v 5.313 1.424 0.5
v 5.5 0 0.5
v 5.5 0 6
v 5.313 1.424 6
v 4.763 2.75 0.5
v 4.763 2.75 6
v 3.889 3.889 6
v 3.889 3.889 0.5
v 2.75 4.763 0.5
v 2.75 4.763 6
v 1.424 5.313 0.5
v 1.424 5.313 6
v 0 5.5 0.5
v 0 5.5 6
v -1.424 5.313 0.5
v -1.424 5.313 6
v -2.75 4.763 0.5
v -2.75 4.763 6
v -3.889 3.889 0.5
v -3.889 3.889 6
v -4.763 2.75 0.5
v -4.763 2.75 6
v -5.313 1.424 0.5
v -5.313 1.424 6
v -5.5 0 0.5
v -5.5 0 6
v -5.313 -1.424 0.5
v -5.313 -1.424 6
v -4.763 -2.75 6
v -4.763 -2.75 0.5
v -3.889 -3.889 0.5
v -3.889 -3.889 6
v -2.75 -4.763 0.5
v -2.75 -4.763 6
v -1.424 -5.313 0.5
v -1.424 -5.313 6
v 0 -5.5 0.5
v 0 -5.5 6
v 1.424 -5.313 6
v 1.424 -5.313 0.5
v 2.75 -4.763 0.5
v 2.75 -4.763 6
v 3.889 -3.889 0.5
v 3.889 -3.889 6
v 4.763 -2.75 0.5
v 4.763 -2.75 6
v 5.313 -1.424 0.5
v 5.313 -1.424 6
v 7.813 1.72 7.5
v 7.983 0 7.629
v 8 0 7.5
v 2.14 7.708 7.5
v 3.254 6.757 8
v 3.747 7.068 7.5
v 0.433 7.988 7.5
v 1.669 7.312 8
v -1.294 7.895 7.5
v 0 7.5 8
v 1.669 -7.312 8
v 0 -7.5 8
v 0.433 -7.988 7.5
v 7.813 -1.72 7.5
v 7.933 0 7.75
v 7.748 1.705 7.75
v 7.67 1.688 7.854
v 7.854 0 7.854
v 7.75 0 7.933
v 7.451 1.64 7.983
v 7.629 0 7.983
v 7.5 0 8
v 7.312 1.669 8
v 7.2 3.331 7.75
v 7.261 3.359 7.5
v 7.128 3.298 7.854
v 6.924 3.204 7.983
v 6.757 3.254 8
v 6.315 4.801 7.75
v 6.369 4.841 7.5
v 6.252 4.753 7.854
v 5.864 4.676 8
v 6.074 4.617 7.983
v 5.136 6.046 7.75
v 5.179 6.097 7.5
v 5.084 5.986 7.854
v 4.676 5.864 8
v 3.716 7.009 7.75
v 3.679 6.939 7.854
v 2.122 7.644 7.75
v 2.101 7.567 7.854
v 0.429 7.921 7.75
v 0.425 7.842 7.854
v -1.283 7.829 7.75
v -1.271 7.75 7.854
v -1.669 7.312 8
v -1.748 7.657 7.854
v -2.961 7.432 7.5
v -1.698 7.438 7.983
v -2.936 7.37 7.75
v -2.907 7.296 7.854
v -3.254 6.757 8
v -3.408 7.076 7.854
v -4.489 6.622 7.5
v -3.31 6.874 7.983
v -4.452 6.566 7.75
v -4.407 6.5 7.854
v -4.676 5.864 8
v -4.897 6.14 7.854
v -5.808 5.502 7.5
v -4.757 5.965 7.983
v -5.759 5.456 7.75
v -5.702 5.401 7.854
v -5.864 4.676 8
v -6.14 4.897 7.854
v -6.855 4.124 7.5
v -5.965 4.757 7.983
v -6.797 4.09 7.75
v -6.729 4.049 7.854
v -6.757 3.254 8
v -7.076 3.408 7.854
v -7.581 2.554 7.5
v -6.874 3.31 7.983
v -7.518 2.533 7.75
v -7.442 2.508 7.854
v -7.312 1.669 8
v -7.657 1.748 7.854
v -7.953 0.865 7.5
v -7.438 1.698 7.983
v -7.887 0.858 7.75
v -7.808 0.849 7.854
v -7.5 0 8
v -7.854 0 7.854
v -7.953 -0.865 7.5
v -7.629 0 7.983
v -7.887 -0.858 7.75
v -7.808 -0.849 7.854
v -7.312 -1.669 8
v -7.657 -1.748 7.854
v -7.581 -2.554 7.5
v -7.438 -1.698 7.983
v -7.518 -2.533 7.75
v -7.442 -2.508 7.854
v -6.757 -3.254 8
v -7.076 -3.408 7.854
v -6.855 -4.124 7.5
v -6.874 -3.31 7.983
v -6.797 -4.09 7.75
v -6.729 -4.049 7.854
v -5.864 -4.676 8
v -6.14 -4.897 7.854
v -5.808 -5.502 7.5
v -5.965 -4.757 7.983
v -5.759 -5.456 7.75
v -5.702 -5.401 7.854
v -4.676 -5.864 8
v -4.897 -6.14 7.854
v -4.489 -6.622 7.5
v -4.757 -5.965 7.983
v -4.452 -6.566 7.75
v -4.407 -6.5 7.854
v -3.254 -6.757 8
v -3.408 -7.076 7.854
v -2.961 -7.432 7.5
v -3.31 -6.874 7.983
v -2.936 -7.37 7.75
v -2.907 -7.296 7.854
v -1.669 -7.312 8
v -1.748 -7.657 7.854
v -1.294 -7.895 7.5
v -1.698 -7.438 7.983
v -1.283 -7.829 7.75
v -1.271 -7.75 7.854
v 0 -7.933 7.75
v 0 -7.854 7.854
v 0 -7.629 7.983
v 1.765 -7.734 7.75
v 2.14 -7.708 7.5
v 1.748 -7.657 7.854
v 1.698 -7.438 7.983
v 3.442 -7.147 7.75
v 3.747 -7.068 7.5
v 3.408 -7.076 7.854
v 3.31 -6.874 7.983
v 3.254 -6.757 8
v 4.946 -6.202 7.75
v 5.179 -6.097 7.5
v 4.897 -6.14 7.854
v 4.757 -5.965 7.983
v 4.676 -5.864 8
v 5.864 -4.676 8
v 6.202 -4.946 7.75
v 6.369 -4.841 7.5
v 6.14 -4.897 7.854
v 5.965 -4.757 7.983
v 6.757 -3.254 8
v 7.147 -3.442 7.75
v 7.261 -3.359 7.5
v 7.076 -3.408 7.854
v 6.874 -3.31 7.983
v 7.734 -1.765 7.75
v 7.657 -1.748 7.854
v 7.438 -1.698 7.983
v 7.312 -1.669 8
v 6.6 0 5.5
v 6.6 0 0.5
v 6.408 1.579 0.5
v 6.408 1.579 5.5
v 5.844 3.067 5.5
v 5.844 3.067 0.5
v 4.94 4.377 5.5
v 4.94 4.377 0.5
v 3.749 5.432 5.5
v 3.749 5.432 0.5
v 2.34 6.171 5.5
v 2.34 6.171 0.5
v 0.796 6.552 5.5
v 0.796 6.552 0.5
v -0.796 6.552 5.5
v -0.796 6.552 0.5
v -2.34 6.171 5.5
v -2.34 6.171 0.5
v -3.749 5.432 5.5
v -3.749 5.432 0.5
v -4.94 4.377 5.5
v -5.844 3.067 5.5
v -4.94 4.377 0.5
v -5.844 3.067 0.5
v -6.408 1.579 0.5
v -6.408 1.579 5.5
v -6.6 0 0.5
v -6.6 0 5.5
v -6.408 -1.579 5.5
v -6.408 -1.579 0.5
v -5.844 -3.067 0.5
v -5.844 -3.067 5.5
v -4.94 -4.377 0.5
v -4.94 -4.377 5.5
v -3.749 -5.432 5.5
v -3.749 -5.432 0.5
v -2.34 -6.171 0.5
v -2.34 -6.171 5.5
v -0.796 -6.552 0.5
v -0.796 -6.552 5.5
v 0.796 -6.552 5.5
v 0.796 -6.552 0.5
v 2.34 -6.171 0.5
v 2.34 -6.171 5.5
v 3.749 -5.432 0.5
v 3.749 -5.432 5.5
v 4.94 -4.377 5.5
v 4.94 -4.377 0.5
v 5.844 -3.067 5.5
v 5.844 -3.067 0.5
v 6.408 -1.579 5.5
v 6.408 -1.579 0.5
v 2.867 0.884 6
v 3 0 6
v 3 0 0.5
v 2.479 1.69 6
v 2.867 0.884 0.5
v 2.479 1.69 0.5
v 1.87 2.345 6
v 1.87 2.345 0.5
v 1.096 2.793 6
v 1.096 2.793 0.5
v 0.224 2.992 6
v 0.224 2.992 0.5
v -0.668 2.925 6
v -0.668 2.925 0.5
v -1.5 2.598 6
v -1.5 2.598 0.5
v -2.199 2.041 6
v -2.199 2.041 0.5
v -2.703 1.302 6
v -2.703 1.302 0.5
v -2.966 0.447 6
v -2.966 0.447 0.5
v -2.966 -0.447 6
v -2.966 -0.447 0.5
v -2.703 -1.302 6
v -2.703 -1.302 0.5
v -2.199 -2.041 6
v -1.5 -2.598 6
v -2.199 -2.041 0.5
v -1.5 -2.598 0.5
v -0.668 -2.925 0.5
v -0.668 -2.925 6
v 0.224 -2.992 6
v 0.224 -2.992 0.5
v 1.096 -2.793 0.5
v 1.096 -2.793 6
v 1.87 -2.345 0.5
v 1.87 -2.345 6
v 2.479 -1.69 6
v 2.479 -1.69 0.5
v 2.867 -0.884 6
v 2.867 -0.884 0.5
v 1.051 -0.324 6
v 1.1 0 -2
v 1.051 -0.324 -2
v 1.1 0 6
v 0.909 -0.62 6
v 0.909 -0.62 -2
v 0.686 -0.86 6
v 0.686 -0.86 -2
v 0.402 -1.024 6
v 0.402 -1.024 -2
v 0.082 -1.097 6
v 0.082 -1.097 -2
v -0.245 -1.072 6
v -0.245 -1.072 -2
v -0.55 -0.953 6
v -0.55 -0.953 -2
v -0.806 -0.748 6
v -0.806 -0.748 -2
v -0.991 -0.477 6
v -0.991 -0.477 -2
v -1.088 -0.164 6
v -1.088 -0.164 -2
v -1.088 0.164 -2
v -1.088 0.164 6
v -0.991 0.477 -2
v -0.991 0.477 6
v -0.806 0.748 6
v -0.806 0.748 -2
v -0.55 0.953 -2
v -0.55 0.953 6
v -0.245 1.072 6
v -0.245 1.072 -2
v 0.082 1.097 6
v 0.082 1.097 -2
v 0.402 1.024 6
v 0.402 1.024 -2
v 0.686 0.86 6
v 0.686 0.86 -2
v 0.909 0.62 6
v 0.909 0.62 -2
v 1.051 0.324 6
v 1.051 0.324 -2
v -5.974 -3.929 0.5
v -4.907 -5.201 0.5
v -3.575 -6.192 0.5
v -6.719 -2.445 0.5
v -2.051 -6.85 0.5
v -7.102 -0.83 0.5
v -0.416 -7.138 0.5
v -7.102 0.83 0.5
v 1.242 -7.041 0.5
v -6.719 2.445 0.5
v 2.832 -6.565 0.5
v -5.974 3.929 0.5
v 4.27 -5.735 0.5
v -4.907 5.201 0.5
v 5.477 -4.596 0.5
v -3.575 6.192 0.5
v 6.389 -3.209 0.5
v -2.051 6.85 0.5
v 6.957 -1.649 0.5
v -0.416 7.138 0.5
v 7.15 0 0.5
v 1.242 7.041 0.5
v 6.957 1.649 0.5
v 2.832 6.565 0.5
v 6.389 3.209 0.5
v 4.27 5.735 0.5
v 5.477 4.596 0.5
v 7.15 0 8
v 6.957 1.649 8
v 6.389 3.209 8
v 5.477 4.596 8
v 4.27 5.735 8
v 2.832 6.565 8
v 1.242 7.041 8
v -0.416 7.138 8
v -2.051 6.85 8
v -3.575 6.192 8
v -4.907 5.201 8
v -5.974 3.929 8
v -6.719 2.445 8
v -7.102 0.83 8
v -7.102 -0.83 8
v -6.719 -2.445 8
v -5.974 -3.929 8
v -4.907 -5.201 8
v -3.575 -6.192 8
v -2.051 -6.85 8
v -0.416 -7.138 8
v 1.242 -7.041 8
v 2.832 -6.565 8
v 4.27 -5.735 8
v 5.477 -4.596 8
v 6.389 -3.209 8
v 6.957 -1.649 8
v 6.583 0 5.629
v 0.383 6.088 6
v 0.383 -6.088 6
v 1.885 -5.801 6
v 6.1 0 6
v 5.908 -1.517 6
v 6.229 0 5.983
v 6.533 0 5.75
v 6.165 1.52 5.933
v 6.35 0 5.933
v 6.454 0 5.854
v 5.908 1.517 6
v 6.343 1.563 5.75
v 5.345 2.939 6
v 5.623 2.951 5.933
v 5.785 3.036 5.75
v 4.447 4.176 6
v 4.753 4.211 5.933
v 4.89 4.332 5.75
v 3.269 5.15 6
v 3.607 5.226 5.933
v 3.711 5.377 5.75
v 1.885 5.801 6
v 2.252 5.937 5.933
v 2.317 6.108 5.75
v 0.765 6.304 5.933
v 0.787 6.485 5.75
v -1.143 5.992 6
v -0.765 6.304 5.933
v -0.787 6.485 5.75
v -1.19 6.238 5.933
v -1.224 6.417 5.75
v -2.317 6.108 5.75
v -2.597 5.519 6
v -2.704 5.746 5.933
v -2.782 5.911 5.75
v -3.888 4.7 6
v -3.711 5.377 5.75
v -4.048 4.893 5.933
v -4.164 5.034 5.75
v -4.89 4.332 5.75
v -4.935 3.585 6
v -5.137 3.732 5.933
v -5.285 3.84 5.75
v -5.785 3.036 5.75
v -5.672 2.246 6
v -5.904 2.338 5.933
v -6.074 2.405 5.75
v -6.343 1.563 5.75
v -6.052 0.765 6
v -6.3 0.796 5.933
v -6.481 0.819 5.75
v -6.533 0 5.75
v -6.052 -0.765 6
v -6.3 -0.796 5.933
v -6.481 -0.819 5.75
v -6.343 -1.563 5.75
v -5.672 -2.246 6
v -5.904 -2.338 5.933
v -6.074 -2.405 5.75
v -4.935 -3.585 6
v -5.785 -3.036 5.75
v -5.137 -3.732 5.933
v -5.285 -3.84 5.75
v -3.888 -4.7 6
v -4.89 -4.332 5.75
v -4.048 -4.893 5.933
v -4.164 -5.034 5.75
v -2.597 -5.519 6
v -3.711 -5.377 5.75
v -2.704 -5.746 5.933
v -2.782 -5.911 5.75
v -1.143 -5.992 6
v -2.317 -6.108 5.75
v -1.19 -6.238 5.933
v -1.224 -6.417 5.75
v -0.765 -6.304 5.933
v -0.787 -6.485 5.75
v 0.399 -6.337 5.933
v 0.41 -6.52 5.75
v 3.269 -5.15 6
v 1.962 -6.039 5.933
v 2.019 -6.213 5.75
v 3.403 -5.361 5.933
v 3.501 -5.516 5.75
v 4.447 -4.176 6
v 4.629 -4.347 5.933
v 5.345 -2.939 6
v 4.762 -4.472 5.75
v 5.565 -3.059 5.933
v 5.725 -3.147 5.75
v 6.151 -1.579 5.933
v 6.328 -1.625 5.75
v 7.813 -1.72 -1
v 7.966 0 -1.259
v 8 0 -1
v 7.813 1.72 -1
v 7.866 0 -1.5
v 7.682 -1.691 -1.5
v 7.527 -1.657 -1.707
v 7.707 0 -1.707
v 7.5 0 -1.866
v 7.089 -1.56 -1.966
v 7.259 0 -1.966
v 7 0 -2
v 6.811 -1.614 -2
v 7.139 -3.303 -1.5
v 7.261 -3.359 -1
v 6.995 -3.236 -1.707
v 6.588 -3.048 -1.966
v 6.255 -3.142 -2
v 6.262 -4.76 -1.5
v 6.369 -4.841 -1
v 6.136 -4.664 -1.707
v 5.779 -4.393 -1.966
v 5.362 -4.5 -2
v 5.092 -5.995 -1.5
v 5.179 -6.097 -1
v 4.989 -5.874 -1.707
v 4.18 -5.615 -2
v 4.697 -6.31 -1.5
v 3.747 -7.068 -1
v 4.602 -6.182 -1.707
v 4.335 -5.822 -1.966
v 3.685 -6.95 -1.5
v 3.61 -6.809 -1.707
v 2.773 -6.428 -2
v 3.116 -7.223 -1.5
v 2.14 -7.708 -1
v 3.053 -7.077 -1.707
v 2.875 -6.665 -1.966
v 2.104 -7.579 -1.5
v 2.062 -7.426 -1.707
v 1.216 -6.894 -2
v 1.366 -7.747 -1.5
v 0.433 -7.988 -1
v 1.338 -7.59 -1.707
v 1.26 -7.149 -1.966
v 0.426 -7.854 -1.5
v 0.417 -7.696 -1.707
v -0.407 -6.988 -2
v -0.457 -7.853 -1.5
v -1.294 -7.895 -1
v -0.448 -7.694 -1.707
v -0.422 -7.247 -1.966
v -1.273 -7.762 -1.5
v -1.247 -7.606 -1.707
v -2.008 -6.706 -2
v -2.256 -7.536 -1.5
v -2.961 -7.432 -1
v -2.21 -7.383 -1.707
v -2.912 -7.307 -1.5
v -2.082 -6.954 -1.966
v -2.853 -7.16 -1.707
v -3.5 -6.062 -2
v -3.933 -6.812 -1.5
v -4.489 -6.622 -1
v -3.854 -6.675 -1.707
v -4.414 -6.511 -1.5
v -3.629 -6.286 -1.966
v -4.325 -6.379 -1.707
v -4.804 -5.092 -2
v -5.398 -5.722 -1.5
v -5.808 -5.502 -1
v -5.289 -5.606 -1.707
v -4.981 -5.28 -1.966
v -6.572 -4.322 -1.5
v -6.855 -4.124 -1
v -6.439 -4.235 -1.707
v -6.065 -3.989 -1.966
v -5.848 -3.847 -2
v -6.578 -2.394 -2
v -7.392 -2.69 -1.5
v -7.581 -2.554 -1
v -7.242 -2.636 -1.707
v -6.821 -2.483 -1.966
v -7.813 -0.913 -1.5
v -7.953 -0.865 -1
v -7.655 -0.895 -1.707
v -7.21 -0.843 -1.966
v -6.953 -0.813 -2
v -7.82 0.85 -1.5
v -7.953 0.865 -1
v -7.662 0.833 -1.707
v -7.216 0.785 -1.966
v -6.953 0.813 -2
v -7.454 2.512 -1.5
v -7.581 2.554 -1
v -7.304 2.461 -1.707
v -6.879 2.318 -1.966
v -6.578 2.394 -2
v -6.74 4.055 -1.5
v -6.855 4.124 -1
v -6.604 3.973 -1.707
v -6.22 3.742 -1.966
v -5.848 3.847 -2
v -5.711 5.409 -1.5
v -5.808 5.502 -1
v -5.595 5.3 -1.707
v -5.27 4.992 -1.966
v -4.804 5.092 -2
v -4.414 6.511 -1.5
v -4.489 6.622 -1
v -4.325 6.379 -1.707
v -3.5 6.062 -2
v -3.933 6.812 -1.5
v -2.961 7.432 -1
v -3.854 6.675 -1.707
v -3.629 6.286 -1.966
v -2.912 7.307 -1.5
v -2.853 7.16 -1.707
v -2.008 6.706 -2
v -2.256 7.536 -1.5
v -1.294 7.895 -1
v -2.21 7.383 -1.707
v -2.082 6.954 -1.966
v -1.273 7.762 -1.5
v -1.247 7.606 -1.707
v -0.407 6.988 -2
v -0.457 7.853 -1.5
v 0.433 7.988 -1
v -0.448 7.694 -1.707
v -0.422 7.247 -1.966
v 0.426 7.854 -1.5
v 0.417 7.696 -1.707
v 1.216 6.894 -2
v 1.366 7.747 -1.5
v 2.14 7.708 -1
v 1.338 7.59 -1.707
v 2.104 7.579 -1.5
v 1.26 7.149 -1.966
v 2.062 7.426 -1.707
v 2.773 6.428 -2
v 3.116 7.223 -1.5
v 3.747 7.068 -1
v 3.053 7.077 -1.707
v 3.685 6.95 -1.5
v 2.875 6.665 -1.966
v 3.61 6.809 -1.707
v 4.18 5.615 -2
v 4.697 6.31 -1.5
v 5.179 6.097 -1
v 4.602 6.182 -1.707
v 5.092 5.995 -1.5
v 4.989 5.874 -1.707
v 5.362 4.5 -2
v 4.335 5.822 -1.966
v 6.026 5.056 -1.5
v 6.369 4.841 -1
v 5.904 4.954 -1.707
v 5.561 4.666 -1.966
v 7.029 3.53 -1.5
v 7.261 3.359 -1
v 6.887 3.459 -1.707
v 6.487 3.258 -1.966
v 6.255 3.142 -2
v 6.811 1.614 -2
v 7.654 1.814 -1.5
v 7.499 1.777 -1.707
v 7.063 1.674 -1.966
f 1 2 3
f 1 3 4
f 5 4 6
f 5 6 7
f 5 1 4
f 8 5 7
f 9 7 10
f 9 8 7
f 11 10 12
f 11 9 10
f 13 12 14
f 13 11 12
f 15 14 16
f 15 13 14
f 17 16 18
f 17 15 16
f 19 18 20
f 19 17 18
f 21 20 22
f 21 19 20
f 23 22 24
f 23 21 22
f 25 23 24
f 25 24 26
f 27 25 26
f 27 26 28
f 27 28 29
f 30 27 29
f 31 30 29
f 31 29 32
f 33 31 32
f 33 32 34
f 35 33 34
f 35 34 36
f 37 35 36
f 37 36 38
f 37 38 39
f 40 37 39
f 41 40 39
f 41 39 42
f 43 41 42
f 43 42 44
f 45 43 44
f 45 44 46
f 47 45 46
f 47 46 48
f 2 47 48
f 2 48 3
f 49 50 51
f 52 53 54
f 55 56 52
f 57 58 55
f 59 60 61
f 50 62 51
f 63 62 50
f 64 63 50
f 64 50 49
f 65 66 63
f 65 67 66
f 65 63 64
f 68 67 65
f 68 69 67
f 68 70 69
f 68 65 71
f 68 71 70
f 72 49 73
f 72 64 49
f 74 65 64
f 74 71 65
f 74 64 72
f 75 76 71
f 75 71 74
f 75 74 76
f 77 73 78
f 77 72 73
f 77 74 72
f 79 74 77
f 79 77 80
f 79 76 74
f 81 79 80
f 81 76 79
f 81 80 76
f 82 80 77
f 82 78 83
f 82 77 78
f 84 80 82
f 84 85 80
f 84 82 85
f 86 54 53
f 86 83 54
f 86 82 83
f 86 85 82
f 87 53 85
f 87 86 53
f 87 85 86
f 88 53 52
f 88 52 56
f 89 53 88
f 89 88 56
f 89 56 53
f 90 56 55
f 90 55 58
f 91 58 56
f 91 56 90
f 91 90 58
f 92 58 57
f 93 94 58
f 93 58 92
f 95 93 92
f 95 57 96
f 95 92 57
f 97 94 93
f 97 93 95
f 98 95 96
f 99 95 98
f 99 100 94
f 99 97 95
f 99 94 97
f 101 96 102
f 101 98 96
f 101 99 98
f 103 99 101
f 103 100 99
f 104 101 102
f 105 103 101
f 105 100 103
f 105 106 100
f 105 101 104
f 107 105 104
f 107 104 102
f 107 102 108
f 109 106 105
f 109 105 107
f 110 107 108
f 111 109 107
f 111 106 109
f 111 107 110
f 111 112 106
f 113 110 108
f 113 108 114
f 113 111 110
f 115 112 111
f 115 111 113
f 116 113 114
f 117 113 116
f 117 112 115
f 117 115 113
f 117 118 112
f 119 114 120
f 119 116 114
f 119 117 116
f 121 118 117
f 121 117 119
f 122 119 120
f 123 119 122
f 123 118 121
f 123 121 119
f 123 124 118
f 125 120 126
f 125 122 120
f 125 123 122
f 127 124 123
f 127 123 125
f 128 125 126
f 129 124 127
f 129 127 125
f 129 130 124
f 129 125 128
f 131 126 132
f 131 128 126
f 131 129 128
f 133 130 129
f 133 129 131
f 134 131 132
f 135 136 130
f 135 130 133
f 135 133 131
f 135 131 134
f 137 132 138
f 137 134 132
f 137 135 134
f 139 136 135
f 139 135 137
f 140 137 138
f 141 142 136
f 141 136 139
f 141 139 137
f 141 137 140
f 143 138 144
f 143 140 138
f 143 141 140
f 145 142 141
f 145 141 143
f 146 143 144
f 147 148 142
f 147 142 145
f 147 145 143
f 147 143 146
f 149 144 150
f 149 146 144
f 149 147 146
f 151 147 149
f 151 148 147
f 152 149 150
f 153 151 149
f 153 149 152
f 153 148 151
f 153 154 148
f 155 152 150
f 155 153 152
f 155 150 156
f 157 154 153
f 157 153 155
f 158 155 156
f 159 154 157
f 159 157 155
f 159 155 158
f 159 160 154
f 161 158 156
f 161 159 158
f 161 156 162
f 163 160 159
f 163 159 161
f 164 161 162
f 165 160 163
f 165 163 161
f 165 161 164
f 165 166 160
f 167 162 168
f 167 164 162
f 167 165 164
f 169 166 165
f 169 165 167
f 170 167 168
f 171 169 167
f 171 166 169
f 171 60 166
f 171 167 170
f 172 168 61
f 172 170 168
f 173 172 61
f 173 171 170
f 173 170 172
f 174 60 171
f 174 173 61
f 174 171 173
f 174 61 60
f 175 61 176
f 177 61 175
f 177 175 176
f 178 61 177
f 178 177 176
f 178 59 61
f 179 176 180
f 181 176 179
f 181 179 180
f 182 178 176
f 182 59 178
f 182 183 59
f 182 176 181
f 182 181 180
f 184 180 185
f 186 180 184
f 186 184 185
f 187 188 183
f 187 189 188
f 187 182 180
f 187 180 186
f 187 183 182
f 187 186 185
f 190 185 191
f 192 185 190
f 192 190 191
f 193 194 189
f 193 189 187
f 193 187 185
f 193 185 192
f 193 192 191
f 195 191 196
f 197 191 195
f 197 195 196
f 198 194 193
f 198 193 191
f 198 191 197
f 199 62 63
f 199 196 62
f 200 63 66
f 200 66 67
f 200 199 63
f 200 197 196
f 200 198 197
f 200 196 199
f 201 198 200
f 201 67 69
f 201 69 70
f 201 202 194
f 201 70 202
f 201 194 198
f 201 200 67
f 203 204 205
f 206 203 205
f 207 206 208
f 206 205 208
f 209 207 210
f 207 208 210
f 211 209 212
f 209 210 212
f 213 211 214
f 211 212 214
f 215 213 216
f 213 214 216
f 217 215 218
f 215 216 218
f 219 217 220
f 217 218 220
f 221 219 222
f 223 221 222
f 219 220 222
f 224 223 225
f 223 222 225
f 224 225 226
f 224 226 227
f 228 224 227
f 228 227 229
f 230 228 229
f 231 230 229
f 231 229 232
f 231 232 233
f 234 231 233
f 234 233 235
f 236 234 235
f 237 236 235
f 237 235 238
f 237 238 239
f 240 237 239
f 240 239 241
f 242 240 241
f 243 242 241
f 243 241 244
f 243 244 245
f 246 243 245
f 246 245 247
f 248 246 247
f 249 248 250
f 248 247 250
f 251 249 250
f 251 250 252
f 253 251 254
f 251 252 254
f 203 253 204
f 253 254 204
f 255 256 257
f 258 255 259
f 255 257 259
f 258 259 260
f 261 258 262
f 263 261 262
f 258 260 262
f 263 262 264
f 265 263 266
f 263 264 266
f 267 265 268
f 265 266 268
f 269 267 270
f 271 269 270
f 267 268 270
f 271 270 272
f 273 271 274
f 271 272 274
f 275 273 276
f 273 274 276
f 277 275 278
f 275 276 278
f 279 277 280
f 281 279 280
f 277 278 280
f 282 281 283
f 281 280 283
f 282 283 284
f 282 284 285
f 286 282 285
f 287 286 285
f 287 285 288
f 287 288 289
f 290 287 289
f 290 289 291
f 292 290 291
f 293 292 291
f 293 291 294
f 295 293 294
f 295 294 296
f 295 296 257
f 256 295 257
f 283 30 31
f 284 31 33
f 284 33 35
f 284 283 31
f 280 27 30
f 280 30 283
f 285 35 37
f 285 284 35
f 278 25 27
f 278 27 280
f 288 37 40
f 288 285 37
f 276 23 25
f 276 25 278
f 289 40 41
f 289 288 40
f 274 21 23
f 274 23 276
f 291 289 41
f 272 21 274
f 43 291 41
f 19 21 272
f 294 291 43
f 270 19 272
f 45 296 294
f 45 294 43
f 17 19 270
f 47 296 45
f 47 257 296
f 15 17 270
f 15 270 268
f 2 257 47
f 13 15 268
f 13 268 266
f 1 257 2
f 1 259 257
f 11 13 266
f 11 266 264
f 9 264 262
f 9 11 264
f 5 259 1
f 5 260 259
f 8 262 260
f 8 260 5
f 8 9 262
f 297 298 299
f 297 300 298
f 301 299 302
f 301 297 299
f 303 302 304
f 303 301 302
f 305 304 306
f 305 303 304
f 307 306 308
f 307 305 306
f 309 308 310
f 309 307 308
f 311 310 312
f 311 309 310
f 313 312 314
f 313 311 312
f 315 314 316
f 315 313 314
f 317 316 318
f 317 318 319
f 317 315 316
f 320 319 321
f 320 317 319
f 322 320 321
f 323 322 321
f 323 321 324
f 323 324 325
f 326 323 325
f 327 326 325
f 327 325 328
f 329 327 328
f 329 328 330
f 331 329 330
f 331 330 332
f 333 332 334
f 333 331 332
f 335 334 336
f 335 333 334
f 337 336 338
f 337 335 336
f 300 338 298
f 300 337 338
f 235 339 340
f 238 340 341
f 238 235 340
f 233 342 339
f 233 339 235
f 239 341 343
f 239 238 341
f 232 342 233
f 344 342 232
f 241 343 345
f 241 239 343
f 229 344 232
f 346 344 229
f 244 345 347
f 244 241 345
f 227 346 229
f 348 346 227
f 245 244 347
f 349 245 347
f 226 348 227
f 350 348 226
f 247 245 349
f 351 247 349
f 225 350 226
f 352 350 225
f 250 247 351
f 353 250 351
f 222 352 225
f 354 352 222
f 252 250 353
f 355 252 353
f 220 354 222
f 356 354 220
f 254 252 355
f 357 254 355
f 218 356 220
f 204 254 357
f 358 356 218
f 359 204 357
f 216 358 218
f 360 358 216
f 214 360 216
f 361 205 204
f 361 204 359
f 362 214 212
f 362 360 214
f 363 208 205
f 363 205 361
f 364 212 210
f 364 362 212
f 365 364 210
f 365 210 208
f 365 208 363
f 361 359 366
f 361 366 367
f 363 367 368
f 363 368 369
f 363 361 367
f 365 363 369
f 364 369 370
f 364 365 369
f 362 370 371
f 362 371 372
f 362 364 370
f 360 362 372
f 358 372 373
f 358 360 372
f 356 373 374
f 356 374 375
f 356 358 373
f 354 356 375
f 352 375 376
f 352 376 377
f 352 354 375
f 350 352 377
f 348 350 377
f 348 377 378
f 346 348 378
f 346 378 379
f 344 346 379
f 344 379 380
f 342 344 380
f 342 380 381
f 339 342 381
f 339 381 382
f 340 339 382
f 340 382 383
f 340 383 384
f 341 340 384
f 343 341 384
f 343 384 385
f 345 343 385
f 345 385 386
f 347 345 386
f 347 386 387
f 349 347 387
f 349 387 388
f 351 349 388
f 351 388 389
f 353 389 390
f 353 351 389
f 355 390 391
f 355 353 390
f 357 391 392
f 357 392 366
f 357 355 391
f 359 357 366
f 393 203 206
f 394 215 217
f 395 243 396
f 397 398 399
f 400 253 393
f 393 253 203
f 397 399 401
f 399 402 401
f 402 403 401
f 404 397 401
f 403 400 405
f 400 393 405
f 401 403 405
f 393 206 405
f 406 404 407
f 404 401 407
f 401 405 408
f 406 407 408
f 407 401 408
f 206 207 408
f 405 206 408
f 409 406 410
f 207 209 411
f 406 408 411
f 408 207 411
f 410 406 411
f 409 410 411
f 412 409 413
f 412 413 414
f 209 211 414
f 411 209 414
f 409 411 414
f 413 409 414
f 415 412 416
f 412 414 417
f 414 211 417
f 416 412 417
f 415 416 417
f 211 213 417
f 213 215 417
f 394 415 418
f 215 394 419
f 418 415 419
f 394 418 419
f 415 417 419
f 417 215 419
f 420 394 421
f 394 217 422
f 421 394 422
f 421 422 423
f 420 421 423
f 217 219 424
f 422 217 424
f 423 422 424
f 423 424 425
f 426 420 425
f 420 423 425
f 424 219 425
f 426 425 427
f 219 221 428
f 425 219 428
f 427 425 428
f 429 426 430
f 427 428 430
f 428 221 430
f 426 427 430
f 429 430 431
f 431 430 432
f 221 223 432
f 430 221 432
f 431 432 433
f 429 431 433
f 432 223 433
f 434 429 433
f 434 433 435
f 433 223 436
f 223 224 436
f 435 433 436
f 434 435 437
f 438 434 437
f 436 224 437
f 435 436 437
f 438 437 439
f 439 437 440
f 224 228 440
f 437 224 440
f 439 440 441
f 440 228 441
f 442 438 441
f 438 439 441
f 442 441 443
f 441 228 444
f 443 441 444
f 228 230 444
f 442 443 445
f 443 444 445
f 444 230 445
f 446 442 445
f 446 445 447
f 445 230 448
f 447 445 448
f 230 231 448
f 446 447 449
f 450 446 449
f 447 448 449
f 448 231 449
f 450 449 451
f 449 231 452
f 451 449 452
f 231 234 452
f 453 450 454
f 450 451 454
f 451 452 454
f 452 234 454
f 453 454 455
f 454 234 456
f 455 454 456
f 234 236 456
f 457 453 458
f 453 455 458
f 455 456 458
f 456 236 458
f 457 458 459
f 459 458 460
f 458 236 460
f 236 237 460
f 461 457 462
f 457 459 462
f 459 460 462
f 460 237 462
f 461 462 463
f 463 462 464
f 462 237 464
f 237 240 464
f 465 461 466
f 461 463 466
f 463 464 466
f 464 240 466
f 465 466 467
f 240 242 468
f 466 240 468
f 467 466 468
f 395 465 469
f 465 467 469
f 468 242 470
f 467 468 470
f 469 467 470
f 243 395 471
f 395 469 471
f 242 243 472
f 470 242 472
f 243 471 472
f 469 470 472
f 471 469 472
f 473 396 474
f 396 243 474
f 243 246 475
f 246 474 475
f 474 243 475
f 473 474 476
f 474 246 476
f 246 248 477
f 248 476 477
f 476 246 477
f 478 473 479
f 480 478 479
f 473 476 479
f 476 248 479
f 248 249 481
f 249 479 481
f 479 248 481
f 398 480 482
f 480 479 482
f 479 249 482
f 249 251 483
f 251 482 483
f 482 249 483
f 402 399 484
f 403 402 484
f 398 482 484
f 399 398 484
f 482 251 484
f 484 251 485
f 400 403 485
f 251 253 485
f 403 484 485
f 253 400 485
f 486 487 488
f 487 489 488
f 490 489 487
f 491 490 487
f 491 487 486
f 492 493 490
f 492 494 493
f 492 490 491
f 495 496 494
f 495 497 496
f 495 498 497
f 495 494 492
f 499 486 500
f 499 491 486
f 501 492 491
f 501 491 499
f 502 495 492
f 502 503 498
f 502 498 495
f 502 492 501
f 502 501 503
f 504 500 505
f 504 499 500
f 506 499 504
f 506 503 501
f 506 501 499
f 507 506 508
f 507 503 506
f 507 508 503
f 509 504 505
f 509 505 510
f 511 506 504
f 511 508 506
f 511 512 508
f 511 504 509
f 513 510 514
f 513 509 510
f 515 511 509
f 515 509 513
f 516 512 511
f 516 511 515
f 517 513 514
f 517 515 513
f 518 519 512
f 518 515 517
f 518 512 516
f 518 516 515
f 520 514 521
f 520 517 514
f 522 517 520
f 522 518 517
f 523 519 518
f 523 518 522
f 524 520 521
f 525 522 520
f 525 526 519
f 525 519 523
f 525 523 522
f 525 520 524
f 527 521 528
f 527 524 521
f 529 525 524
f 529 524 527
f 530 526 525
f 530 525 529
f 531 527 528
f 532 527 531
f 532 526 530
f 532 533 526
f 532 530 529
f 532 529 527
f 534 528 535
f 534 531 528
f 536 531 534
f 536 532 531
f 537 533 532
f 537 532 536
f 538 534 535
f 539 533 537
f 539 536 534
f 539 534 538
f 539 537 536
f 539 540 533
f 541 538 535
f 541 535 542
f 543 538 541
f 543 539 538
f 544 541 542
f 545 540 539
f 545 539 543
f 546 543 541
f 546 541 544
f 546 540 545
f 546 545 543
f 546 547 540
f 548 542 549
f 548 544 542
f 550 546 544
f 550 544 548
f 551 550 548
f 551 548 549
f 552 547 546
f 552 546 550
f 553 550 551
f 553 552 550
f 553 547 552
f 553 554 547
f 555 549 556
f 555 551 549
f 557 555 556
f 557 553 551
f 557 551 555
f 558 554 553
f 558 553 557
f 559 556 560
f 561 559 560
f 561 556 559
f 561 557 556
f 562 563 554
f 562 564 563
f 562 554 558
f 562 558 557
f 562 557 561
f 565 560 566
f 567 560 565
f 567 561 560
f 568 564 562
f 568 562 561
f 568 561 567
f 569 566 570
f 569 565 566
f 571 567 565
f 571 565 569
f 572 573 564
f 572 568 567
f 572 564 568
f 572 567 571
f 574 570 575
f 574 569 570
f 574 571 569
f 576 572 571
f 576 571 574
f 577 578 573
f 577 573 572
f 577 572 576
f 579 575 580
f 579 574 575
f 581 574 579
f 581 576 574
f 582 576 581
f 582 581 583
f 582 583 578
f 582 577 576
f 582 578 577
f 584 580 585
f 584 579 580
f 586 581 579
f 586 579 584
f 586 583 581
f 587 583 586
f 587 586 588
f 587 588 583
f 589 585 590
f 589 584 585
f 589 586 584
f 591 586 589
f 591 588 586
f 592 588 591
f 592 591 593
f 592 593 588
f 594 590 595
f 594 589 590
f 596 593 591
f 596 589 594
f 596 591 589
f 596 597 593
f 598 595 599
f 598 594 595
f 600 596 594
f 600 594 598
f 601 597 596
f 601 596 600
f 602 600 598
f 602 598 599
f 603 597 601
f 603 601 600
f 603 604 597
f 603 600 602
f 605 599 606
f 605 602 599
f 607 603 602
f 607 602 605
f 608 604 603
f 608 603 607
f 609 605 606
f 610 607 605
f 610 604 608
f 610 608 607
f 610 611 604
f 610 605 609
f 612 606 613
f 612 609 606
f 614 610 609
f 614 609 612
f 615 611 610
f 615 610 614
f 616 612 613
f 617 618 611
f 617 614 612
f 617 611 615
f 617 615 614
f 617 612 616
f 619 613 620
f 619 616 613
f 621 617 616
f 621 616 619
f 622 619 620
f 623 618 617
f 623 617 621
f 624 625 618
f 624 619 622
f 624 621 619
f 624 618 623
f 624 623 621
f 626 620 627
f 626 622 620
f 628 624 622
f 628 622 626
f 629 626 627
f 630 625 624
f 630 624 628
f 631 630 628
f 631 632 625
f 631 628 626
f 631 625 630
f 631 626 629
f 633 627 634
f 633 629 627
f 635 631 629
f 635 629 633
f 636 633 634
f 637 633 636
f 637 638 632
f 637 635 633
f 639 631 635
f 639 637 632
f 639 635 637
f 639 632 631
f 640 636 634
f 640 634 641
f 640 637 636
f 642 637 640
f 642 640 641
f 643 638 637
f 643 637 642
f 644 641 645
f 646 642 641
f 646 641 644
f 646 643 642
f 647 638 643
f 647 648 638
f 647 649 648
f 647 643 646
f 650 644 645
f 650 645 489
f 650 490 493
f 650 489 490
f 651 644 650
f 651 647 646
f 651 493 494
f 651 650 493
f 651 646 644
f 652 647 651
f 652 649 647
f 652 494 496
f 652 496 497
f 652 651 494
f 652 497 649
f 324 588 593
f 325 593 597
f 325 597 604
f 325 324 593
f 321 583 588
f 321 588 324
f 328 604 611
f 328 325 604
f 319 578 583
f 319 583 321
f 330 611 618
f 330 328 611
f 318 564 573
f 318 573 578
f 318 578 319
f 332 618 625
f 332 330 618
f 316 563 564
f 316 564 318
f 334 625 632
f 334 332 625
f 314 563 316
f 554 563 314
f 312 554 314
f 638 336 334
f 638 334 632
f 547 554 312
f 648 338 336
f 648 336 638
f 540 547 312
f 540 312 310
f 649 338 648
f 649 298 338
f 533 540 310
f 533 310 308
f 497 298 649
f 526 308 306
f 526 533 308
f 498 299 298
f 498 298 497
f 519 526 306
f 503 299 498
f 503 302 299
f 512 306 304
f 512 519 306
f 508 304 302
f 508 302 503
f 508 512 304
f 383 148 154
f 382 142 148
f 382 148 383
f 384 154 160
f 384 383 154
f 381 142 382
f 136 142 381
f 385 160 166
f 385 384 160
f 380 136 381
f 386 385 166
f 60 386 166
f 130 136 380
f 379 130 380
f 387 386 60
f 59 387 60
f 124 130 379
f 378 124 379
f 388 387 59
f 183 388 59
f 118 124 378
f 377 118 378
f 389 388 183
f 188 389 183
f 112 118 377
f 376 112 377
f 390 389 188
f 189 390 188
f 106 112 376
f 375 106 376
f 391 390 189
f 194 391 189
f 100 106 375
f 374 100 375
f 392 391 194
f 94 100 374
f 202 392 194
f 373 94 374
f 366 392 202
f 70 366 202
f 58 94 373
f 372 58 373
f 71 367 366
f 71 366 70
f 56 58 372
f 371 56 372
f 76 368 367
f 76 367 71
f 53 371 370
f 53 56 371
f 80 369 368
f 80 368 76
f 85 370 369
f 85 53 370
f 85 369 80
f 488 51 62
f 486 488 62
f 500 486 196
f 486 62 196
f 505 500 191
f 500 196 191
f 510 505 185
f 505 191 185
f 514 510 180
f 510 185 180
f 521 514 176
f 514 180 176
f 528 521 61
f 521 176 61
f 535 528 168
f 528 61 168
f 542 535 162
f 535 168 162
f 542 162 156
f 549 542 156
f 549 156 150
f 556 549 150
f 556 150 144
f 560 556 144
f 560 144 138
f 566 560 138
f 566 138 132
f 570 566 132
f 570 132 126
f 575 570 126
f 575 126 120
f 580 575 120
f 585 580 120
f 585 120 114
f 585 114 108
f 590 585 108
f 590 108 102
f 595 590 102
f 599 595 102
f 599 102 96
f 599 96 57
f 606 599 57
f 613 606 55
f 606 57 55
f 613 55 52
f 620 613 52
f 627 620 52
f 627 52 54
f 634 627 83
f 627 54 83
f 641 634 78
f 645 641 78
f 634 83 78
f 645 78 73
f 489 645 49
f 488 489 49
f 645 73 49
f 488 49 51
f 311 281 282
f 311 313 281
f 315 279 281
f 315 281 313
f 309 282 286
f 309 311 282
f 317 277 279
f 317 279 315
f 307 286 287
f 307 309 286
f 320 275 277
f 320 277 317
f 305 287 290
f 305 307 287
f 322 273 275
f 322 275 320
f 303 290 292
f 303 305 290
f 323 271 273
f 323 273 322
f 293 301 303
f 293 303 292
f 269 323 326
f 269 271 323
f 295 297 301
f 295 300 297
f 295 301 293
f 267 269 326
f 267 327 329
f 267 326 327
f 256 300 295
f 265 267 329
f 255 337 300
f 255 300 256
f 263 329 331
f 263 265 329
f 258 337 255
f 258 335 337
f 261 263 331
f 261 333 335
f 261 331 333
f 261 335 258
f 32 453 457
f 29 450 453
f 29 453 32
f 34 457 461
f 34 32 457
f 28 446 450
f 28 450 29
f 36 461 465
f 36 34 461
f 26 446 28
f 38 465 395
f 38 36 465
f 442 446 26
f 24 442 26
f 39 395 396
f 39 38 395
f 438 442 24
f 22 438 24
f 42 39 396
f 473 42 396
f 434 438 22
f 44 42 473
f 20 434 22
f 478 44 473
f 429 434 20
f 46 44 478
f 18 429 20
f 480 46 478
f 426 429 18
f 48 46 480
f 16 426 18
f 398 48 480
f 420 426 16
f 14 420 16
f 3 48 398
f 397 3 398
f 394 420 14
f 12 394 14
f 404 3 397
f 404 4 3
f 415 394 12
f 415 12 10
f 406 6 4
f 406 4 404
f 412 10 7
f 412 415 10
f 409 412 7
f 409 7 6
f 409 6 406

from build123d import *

# Parameters (mm, degrees)
F0_R        = 6.6
F0_R_2      = 5.5
F1_DEPTH    = 6
F0_R_3      = 7.15
F0_R_4      = 3
F2_DEPTH    = 0.5
F0_R_5      = 8
F3_DEPTH    = 8
F0_R_6      = 1.1
F4_DEPTH    = 6
F5_R        = 0.5
F4_FACE_R   = 8
F4_FACE_R_2 = 1.1
F6_DEPTH    = 2
F7_R        = 1


with BuildPart() as f1:
    # F0 (on Top) → F1 (new body)
    with BuildSketch(Plane.XY):
        Circle(F0_R)
        Circle(F0_R_2, mode=Mode.SUBTRACT)
    extrude(amount=F1_DEPTH)

    # F0 (on Top) → F2 (join)
    with BuildSketch(Plane.XY):
        Circle(F0_R_3)
        Circle(F0_R, mode=Mode.SUBTRACT)
        Circle(F0_R_2)
        Circle(F0_R_4, mode=Mode.SUBTRACT)
    extrude(amount=F2_DEPTH)

    # F0 (on Top) → F3 (join)
    with BuildSketch(Plane.XY):
        Circle(F0_R_5)
        Circle(F0_R_3, mode=Mode.SUBTRACT)
    extrude(amount=F3_DEPTH)

    # F0 (on Top) → F4 (join)
    with BuildSketch(Plane.XY):
        Circle(F0_R_4)
        Circle(F0_R_6, mode=Mode.SUBTRACT)
    extrude(amount=F4_DEPTH)

    # F5
    f5_edges = [f1.edges().sort_by_distance(p)[0] for p in [
        (-6.6, 0, 6),
        (-8, 0, 8),
    ]]
    fillet(f5_edges, radius=F5_R)

    # F4_face (on face) → F6 (join)
    with BuildSketch(Plane(origin=(0, 0, 0), x_dir=(1, 0, 0), z_dir=(0, 0, -1))):
        Circle(F4_FACE_R)
        Circle(F4_FACE_R_2, mode=Mode.SUBTRACT)
    extrude(amount=F6_DEPTH)

    # F7
    f7_edges = [f1.edges().sort_by_distance(p)[0] for p in [
        (-8, 0, -2),
    ]]
    fillet(f7_edges, radius=F7_R)


solid = f1.part
